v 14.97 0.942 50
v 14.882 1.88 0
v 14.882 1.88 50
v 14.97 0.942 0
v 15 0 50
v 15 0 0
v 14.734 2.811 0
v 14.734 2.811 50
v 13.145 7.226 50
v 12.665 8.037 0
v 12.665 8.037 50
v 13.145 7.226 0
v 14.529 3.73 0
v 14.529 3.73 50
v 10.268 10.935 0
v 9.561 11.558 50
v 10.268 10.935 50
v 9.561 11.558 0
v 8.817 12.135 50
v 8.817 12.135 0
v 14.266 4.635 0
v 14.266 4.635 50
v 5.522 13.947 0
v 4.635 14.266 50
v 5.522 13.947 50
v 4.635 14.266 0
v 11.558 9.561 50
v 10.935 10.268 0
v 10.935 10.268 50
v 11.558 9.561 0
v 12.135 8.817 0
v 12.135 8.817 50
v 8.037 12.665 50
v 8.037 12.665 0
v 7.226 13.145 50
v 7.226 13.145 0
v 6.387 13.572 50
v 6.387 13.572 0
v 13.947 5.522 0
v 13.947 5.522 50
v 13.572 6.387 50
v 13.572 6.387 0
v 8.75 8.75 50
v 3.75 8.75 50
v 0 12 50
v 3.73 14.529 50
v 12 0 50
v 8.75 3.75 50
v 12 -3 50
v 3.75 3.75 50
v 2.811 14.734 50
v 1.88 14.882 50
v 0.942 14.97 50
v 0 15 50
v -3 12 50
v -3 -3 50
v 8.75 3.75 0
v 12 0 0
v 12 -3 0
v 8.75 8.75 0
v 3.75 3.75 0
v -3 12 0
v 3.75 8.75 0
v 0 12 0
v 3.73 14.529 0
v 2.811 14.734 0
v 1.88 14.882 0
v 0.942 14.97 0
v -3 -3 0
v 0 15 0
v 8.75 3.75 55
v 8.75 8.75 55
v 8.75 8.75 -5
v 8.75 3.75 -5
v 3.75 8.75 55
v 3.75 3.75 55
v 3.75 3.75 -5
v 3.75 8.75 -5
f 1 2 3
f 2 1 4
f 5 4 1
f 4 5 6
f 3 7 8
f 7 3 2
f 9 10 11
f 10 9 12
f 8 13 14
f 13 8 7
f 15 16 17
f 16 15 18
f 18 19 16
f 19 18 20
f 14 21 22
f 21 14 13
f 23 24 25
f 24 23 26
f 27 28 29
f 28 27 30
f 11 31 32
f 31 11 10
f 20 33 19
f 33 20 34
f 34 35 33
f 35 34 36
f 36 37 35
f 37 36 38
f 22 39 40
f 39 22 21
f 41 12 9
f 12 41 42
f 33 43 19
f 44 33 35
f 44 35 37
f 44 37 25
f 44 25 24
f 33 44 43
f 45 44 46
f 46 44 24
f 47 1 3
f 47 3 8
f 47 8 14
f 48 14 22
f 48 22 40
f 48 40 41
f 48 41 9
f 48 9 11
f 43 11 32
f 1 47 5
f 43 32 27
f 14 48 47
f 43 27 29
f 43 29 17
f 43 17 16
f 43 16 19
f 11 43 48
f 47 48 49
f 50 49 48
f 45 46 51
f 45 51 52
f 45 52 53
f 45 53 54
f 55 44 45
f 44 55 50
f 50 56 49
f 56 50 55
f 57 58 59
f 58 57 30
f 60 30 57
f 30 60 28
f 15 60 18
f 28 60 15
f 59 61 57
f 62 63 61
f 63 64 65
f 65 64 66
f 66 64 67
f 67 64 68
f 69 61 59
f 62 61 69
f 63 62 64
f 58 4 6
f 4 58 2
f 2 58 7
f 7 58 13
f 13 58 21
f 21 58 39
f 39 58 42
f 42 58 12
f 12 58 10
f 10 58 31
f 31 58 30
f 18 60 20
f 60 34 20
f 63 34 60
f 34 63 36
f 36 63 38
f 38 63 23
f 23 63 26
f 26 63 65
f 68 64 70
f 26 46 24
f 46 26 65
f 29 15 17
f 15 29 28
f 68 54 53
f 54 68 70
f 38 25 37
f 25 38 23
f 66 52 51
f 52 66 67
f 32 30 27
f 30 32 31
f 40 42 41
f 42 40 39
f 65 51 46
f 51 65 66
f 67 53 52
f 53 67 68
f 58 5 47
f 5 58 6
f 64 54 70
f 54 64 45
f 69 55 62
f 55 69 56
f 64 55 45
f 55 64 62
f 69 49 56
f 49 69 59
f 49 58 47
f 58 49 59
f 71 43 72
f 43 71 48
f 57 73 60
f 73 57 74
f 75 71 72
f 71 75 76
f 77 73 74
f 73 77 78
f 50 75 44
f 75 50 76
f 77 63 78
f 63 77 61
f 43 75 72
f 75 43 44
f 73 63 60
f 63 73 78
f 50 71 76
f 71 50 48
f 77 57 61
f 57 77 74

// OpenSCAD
$fn = 100;

module box_edge(radius = 15, size = 50, wall_thickness = 3, wall_bearing_surface = 3) {
    difference() {
        cylinder(r=radius, h=size);
        translate([-radius, -radius, -1]) cube([2*radius, radius, size+2]);
        translate([-radius, -1, -1]) cube([radius, 2*radius, size+2]);
    }
    translate([-wall_thickness, -wall_thickness, 0])
    cube([wall_bearing_surface, radius-wall_thickness+wall_bearing_surface, size]);

    translate([-wall_thickness, -wall_thickness, 0])
    cube([radius-wall_thickness+wall_bearing_surface, wall_bearing_surface, size]);

    translate([radius/4, radius/4, -radius/3]) cube([radius/3,radius/3,radius*2/3+size]);
}

box_edge();
